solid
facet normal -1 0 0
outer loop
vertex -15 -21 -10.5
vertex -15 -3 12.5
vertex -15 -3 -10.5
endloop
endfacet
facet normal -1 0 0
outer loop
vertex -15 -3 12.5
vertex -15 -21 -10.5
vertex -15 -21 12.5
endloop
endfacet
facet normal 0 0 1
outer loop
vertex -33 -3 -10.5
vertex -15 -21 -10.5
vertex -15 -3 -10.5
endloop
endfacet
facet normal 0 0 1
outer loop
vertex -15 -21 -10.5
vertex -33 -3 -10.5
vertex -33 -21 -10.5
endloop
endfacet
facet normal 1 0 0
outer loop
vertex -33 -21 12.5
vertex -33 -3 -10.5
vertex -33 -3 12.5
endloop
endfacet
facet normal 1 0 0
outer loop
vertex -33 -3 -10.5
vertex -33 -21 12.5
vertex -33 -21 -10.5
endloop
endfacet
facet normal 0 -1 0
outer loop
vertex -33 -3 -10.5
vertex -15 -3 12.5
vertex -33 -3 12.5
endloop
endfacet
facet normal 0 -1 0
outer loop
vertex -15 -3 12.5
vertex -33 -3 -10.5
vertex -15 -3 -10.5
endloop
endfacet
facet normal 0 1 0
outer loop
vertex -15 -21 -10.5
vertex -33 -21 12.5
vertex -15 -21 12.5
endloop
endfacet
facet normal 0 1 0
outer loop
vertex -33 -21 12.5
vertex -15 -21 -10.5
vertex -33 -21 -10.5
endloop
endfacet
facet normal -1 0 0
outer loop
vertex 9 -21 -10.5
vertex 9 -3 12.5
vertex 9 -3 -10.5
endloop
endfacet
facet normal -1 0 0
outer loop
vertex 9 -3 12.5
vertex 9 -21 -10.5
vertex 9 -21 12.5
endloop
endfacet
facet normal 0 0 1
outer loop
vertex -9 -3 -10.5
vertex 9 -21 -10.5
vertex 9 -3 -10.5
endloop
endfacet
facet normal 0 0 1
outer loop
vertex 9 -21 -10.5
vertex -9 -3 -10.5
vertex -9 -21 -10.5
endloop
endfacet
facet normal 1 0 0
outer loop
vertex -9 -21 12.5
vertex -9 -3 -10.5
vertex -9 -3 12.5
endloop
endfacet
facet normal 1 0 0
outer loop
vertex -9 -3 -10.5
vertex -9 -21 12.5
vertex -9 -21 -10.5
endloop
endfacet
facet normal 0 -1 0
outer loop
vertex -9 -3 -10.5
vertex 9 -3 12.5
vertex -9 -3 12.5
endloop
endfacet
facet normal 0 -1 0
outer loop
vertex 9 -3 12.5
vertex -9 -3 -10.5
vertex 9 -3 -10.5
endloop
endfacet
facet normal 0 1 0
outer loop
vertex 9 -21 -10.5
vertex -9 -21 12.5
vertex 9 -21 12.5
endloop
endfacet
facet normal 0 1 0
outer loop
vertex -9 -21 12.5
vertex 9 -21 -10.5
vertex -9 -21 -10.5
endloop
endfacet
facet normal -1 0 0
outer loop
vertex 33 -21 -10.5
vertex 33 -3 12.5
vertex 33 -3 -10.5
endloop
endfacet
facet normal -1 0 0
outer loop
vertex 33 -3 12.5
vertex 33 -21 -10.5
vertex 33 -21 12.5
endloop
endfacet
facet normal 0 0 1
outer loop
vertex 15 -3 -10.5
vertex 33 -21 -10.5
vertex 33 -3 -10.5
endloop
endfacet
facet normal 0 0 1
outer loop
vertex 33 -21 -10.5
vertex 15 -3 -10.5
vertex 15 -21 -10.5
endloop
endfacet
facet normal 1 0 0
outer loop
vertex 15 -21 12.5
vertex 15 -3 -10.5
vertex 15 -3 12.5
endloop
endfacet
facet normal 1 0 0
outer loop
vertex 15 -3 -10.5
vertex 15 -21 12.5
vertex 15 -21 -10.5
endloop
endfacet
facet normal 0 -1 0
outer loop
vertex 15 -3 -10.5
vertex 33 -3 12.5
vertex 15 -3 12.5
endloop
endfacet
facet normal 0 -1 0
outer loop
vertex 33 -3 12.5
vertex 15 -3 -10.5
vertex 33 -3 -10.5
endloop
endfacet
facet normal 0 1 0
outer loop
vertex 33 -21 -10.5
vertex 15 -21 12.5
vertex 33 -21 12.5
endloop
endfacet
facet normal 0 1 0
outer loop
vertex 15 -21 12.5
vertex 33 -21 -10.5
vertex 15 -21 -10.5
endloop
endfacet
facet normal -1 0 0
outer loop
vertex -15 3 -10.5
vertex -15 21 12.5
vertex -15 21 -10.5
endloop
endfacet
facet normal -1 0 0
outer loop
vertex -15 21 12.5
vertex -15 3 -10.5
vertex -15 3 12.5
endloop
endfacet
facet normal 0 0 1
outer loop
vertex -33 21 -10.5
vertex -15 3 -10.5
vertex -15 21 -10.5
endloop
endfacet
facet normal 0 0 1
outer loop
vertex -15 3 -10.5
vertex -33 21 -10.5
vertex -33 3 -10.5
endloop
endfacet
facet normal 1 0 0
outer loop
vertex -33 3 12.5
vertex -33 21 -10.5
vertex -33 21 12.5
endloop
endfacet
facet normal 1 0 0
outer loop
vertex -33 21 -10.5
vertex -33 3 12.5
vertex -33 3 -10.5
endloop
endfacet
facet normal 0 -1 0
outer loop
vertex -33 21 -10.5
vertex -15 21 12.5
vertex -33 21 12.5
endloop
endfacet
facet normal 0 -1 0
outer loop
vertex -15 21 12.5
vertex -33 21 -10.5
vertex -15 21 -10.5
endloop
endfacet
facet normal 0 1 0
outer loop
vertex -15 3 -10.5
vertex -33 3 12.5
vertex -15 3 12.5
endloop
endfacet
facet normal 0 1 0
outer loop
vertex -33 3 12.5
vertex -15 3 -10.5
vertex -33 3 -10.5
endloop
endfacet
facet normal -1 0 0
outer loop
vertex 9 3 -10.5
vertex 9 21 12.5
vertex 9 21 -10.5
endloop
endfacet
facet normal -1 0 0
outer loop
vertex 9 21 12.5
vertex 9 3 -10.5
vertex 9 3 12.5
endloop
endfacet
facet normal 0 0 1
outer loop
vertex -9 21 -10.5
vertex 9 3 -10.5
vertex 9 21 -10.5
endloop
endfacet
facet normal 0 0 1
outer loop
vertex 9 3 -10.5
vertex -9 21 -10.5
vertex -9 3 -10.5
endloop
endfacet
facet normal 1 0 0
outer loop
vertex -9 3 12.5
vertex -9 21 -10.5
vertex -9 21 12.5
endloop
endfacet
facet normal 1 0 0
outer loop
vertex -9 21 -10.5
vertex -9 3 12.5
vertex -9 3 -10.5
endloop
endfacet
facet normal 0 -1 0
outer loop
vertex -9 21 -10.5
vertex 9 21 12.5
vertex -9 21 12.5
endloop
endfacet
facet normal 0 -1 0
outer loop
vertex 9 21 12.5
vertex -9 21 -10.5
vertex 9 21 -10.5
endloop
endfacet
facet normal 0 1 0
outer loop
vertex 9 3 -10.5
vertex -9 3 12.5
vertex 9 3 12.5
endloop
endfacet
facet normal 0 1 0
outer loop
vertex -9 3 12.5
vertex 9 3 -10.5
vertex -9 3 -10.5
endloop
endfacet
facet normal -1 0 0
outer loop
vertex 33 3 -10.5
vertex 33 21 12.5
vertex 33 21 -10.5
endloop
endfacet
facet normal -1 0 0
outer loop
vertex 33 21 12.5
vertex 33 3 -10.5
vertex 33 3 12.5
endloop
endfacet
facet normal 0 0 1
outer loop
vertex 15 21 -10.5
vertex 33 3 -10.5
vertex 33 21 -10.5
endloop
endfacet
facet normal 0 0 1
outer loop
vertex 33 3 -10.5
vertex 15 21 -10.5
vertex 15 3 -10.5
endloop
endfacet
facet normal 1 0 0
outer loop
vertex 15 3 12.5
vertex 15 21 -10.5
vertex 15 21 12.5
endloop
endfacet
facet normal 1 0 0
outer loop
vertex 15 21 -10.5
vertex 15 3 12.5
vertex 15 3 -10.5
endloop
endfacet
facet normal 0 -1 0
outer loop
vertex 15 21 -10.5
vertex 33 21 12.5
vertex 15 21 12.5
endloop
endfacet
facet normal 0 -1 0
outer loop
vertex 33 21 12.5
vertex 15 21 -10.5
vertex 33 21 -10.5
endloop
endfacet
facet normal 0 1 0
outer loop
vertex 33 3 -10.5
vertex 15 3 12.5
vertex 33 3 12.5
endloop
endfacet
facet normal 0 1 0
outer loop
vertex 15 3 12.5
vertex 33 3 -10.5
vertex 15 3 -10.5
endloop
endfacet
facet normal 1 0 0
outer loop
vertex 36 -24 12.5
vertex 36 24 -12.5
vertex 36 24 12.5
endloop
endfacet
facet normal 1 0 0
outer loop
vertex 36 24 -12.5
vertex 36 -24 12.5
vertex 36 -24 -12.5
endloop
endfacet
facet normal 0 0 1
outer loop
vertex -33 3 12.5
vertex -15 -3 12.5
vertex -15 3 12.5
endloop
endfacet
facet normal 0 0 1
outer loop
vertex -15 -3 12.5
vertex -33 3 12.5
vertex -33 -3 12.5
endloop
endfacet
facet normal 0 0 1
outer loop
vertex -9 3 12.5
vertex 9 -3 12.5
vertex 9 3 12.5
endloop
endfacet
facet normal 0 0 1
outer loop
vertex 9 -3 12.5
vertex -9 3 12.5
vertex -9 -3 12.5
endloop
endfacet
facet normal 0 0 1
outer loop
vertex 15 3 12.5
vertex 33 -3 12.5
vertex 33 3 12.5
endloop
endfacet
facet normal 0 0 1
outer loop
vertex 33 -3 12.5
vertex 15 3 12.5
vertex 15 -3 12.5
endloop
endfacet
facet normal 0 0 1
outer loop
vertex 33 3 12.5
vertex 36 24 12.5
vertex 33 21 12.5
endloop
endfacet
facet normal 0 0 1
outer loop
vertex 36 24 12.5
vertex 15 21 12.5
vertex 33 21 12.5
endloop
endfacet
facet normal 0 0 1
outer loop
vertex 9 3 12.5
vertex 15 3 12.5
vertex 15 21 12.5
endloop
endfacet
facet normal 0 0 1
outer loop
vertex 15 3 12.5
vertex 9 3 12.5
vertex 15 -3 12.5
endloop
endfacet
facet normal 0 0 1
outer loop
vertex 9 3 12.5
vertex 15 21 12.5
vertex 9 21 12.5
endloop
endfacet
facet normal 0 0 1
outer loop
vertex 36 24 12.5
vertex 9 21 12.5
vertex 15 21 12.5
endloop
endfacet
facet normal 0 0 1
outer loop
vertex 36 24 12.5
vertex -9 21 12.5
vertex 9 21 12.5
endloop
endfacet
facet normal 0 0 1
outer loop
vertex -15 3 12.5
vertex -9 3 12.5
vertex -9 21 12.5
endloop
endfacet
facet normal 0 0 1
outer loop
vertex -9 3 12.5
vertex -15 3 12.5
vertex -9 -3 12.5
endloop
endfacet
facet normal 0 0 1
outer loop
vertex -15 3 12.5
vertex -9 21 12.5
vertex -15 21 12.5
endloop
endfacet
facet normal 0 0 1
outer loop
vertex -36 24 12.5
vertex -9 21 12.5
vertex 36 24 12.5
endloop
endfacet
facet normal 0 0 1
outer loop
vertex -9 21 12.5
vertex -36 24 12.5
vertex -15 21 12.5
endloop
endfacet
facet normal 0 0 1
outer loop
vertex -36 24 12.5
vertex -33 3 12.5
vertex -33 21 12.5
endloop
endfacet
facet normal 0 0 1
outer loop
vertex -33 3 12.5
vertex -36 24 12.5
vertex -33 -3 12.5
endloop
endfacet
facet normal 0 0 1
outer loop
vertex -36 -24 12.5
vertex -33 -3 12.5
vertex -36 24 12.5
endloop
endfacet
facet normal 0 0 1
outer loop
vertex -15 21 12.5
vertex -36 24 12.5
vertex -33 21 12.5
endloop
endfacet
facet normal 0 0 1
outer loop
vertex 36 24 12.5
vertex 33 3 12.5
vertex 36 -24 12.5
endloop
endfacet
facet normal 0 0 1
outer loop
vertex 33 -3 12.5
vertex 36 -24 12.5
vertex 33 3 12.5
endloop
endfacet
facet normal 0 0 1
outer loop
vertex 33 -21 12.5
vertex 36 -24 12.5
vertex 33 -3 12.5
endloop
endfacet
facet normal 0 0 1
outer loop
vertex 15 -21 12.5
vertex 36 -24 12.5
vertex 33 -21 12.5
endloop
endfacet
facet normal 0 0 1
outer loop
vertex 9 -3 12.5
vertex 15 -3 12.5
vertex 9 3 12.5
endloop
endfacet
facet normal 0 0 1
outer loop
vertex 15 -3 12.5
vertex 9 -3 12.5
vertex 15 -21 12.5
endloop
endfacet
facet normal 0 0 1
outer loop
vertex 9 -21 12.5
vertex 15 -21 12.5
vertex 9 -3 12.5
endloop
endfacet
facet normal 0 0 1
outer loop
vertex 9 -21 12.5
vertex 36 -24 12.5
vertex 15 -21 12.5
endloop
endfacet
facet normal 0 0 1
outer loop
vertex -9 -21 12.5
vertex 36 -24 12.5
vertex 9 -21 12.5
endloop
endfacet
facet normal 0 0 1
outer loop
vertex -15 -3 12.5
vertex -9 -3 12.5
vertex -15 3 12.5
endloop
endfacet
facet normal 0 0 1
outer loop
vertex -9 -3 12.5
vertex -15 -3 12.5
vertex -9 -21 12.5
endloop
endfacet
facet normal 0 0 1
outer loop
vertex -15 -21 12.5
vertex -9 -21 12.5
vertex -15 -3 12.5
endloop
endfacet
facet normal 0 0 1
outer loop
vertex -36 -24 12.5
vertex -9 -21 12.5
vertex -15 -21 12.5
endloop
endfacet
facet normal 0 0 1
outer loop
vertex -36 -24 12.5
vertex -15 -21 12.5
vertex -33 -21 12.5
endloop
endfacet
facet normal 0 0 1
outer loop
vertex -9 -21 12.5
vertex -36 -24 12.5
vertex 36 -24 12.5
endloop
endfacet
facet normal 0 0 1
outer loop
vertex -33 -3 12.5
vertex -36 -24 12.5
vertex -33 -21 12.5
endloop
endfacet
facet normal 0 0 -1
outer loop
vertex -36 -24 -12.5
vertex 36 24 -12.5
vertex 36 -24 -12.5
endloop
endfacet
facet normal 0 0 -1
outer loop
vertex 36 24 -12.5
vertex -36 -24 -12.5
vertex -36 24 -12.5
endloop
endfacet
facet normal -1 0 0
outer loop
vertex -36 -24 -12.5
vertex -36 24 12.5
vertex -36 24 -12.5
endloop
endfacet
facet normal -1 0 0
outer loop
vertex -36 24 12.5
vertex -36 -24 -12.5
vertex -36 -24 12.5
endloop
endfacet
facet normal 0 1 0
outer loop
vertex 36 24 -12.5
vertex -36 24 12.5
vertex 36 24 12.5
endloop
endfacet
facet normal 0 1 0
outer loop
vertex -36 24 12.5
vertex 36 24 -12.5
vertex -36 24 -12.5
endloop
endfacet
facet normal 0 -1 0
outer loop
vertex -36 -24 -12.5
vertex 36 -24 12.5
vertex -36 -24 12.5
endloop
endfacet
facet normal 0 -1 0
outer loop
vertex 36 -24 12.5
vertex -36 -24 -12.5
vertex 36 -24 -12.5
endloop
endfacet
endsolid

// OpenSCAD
$fn = 32;

// ----------------------------------------------------------------------
// Pocket plate 72 x 48 x 25
// 2 x 3 pockets 18 mm square, 23 mm deep
// ----------------------------------------------------------------------

// --- parameters (mm) ---
thickness = 25;  // plate thickness
floor_t = 2;     // material left under each pocket
pocket = 18;     // pocket side length
pitch_x = 24;    // pocket pitch along X
pitch_y = 24;    // pocket pitch along Y
cols = 3;        // pockets per row
rows = 2;        // rows of pockets

// --- derived feature positions (mm) ---
depth = thickness - floor_t;        // = 23   pocket depth, down to the floor
span_x = (cols - 1) * pitch_x;      // = 48   distance between outer pockets
span_y = (rows - 1) * pitch_y;      // = 24   distance between outer pocket rows
origin_x = -span_x / 2;             // = -24   X of the first pocket
origin_y = -span_y / 2;             // = -12   Y of the first pocket
plate = [span_x + pocket + 6, span_y + pocket + 6, thickness];  // = [72, 48, 25]   overall size: pockets plus 3 mm of wall on each side
feature_centers = [
  [origin_x + 0 * pitch_x, origin_y + 0 * pitch_y],
  [origin_x + 1 * pitch_x, origin_y + 0 * pitch_y],
  [origin_x + 2 * pitch_x, origin_y + 0 * pitch_y],
  [origin_x + 0 * pitch_x, origin_y + 1 * pitch_y],
  [origin_x + 1 * pitch_x, origin_y + 1 * pitch_y],
  [origin_x + 2 * pitch_x, origin_y + 1 * pitch_y]
];   // pocket centres, used verbatim by the cutter loop

// plate outline, then one pocket per centre in feature_centers
difference() {
  cube(plate, center = true);
  for (centre = feature_centers)
    translate([centre[0] - pocket / 2, centre[1] - pocket / 2, plate[2] / 2 - depth])
      cube([pocket, pocket, depth + 1]);  // centred on the declared pocket centre
}
